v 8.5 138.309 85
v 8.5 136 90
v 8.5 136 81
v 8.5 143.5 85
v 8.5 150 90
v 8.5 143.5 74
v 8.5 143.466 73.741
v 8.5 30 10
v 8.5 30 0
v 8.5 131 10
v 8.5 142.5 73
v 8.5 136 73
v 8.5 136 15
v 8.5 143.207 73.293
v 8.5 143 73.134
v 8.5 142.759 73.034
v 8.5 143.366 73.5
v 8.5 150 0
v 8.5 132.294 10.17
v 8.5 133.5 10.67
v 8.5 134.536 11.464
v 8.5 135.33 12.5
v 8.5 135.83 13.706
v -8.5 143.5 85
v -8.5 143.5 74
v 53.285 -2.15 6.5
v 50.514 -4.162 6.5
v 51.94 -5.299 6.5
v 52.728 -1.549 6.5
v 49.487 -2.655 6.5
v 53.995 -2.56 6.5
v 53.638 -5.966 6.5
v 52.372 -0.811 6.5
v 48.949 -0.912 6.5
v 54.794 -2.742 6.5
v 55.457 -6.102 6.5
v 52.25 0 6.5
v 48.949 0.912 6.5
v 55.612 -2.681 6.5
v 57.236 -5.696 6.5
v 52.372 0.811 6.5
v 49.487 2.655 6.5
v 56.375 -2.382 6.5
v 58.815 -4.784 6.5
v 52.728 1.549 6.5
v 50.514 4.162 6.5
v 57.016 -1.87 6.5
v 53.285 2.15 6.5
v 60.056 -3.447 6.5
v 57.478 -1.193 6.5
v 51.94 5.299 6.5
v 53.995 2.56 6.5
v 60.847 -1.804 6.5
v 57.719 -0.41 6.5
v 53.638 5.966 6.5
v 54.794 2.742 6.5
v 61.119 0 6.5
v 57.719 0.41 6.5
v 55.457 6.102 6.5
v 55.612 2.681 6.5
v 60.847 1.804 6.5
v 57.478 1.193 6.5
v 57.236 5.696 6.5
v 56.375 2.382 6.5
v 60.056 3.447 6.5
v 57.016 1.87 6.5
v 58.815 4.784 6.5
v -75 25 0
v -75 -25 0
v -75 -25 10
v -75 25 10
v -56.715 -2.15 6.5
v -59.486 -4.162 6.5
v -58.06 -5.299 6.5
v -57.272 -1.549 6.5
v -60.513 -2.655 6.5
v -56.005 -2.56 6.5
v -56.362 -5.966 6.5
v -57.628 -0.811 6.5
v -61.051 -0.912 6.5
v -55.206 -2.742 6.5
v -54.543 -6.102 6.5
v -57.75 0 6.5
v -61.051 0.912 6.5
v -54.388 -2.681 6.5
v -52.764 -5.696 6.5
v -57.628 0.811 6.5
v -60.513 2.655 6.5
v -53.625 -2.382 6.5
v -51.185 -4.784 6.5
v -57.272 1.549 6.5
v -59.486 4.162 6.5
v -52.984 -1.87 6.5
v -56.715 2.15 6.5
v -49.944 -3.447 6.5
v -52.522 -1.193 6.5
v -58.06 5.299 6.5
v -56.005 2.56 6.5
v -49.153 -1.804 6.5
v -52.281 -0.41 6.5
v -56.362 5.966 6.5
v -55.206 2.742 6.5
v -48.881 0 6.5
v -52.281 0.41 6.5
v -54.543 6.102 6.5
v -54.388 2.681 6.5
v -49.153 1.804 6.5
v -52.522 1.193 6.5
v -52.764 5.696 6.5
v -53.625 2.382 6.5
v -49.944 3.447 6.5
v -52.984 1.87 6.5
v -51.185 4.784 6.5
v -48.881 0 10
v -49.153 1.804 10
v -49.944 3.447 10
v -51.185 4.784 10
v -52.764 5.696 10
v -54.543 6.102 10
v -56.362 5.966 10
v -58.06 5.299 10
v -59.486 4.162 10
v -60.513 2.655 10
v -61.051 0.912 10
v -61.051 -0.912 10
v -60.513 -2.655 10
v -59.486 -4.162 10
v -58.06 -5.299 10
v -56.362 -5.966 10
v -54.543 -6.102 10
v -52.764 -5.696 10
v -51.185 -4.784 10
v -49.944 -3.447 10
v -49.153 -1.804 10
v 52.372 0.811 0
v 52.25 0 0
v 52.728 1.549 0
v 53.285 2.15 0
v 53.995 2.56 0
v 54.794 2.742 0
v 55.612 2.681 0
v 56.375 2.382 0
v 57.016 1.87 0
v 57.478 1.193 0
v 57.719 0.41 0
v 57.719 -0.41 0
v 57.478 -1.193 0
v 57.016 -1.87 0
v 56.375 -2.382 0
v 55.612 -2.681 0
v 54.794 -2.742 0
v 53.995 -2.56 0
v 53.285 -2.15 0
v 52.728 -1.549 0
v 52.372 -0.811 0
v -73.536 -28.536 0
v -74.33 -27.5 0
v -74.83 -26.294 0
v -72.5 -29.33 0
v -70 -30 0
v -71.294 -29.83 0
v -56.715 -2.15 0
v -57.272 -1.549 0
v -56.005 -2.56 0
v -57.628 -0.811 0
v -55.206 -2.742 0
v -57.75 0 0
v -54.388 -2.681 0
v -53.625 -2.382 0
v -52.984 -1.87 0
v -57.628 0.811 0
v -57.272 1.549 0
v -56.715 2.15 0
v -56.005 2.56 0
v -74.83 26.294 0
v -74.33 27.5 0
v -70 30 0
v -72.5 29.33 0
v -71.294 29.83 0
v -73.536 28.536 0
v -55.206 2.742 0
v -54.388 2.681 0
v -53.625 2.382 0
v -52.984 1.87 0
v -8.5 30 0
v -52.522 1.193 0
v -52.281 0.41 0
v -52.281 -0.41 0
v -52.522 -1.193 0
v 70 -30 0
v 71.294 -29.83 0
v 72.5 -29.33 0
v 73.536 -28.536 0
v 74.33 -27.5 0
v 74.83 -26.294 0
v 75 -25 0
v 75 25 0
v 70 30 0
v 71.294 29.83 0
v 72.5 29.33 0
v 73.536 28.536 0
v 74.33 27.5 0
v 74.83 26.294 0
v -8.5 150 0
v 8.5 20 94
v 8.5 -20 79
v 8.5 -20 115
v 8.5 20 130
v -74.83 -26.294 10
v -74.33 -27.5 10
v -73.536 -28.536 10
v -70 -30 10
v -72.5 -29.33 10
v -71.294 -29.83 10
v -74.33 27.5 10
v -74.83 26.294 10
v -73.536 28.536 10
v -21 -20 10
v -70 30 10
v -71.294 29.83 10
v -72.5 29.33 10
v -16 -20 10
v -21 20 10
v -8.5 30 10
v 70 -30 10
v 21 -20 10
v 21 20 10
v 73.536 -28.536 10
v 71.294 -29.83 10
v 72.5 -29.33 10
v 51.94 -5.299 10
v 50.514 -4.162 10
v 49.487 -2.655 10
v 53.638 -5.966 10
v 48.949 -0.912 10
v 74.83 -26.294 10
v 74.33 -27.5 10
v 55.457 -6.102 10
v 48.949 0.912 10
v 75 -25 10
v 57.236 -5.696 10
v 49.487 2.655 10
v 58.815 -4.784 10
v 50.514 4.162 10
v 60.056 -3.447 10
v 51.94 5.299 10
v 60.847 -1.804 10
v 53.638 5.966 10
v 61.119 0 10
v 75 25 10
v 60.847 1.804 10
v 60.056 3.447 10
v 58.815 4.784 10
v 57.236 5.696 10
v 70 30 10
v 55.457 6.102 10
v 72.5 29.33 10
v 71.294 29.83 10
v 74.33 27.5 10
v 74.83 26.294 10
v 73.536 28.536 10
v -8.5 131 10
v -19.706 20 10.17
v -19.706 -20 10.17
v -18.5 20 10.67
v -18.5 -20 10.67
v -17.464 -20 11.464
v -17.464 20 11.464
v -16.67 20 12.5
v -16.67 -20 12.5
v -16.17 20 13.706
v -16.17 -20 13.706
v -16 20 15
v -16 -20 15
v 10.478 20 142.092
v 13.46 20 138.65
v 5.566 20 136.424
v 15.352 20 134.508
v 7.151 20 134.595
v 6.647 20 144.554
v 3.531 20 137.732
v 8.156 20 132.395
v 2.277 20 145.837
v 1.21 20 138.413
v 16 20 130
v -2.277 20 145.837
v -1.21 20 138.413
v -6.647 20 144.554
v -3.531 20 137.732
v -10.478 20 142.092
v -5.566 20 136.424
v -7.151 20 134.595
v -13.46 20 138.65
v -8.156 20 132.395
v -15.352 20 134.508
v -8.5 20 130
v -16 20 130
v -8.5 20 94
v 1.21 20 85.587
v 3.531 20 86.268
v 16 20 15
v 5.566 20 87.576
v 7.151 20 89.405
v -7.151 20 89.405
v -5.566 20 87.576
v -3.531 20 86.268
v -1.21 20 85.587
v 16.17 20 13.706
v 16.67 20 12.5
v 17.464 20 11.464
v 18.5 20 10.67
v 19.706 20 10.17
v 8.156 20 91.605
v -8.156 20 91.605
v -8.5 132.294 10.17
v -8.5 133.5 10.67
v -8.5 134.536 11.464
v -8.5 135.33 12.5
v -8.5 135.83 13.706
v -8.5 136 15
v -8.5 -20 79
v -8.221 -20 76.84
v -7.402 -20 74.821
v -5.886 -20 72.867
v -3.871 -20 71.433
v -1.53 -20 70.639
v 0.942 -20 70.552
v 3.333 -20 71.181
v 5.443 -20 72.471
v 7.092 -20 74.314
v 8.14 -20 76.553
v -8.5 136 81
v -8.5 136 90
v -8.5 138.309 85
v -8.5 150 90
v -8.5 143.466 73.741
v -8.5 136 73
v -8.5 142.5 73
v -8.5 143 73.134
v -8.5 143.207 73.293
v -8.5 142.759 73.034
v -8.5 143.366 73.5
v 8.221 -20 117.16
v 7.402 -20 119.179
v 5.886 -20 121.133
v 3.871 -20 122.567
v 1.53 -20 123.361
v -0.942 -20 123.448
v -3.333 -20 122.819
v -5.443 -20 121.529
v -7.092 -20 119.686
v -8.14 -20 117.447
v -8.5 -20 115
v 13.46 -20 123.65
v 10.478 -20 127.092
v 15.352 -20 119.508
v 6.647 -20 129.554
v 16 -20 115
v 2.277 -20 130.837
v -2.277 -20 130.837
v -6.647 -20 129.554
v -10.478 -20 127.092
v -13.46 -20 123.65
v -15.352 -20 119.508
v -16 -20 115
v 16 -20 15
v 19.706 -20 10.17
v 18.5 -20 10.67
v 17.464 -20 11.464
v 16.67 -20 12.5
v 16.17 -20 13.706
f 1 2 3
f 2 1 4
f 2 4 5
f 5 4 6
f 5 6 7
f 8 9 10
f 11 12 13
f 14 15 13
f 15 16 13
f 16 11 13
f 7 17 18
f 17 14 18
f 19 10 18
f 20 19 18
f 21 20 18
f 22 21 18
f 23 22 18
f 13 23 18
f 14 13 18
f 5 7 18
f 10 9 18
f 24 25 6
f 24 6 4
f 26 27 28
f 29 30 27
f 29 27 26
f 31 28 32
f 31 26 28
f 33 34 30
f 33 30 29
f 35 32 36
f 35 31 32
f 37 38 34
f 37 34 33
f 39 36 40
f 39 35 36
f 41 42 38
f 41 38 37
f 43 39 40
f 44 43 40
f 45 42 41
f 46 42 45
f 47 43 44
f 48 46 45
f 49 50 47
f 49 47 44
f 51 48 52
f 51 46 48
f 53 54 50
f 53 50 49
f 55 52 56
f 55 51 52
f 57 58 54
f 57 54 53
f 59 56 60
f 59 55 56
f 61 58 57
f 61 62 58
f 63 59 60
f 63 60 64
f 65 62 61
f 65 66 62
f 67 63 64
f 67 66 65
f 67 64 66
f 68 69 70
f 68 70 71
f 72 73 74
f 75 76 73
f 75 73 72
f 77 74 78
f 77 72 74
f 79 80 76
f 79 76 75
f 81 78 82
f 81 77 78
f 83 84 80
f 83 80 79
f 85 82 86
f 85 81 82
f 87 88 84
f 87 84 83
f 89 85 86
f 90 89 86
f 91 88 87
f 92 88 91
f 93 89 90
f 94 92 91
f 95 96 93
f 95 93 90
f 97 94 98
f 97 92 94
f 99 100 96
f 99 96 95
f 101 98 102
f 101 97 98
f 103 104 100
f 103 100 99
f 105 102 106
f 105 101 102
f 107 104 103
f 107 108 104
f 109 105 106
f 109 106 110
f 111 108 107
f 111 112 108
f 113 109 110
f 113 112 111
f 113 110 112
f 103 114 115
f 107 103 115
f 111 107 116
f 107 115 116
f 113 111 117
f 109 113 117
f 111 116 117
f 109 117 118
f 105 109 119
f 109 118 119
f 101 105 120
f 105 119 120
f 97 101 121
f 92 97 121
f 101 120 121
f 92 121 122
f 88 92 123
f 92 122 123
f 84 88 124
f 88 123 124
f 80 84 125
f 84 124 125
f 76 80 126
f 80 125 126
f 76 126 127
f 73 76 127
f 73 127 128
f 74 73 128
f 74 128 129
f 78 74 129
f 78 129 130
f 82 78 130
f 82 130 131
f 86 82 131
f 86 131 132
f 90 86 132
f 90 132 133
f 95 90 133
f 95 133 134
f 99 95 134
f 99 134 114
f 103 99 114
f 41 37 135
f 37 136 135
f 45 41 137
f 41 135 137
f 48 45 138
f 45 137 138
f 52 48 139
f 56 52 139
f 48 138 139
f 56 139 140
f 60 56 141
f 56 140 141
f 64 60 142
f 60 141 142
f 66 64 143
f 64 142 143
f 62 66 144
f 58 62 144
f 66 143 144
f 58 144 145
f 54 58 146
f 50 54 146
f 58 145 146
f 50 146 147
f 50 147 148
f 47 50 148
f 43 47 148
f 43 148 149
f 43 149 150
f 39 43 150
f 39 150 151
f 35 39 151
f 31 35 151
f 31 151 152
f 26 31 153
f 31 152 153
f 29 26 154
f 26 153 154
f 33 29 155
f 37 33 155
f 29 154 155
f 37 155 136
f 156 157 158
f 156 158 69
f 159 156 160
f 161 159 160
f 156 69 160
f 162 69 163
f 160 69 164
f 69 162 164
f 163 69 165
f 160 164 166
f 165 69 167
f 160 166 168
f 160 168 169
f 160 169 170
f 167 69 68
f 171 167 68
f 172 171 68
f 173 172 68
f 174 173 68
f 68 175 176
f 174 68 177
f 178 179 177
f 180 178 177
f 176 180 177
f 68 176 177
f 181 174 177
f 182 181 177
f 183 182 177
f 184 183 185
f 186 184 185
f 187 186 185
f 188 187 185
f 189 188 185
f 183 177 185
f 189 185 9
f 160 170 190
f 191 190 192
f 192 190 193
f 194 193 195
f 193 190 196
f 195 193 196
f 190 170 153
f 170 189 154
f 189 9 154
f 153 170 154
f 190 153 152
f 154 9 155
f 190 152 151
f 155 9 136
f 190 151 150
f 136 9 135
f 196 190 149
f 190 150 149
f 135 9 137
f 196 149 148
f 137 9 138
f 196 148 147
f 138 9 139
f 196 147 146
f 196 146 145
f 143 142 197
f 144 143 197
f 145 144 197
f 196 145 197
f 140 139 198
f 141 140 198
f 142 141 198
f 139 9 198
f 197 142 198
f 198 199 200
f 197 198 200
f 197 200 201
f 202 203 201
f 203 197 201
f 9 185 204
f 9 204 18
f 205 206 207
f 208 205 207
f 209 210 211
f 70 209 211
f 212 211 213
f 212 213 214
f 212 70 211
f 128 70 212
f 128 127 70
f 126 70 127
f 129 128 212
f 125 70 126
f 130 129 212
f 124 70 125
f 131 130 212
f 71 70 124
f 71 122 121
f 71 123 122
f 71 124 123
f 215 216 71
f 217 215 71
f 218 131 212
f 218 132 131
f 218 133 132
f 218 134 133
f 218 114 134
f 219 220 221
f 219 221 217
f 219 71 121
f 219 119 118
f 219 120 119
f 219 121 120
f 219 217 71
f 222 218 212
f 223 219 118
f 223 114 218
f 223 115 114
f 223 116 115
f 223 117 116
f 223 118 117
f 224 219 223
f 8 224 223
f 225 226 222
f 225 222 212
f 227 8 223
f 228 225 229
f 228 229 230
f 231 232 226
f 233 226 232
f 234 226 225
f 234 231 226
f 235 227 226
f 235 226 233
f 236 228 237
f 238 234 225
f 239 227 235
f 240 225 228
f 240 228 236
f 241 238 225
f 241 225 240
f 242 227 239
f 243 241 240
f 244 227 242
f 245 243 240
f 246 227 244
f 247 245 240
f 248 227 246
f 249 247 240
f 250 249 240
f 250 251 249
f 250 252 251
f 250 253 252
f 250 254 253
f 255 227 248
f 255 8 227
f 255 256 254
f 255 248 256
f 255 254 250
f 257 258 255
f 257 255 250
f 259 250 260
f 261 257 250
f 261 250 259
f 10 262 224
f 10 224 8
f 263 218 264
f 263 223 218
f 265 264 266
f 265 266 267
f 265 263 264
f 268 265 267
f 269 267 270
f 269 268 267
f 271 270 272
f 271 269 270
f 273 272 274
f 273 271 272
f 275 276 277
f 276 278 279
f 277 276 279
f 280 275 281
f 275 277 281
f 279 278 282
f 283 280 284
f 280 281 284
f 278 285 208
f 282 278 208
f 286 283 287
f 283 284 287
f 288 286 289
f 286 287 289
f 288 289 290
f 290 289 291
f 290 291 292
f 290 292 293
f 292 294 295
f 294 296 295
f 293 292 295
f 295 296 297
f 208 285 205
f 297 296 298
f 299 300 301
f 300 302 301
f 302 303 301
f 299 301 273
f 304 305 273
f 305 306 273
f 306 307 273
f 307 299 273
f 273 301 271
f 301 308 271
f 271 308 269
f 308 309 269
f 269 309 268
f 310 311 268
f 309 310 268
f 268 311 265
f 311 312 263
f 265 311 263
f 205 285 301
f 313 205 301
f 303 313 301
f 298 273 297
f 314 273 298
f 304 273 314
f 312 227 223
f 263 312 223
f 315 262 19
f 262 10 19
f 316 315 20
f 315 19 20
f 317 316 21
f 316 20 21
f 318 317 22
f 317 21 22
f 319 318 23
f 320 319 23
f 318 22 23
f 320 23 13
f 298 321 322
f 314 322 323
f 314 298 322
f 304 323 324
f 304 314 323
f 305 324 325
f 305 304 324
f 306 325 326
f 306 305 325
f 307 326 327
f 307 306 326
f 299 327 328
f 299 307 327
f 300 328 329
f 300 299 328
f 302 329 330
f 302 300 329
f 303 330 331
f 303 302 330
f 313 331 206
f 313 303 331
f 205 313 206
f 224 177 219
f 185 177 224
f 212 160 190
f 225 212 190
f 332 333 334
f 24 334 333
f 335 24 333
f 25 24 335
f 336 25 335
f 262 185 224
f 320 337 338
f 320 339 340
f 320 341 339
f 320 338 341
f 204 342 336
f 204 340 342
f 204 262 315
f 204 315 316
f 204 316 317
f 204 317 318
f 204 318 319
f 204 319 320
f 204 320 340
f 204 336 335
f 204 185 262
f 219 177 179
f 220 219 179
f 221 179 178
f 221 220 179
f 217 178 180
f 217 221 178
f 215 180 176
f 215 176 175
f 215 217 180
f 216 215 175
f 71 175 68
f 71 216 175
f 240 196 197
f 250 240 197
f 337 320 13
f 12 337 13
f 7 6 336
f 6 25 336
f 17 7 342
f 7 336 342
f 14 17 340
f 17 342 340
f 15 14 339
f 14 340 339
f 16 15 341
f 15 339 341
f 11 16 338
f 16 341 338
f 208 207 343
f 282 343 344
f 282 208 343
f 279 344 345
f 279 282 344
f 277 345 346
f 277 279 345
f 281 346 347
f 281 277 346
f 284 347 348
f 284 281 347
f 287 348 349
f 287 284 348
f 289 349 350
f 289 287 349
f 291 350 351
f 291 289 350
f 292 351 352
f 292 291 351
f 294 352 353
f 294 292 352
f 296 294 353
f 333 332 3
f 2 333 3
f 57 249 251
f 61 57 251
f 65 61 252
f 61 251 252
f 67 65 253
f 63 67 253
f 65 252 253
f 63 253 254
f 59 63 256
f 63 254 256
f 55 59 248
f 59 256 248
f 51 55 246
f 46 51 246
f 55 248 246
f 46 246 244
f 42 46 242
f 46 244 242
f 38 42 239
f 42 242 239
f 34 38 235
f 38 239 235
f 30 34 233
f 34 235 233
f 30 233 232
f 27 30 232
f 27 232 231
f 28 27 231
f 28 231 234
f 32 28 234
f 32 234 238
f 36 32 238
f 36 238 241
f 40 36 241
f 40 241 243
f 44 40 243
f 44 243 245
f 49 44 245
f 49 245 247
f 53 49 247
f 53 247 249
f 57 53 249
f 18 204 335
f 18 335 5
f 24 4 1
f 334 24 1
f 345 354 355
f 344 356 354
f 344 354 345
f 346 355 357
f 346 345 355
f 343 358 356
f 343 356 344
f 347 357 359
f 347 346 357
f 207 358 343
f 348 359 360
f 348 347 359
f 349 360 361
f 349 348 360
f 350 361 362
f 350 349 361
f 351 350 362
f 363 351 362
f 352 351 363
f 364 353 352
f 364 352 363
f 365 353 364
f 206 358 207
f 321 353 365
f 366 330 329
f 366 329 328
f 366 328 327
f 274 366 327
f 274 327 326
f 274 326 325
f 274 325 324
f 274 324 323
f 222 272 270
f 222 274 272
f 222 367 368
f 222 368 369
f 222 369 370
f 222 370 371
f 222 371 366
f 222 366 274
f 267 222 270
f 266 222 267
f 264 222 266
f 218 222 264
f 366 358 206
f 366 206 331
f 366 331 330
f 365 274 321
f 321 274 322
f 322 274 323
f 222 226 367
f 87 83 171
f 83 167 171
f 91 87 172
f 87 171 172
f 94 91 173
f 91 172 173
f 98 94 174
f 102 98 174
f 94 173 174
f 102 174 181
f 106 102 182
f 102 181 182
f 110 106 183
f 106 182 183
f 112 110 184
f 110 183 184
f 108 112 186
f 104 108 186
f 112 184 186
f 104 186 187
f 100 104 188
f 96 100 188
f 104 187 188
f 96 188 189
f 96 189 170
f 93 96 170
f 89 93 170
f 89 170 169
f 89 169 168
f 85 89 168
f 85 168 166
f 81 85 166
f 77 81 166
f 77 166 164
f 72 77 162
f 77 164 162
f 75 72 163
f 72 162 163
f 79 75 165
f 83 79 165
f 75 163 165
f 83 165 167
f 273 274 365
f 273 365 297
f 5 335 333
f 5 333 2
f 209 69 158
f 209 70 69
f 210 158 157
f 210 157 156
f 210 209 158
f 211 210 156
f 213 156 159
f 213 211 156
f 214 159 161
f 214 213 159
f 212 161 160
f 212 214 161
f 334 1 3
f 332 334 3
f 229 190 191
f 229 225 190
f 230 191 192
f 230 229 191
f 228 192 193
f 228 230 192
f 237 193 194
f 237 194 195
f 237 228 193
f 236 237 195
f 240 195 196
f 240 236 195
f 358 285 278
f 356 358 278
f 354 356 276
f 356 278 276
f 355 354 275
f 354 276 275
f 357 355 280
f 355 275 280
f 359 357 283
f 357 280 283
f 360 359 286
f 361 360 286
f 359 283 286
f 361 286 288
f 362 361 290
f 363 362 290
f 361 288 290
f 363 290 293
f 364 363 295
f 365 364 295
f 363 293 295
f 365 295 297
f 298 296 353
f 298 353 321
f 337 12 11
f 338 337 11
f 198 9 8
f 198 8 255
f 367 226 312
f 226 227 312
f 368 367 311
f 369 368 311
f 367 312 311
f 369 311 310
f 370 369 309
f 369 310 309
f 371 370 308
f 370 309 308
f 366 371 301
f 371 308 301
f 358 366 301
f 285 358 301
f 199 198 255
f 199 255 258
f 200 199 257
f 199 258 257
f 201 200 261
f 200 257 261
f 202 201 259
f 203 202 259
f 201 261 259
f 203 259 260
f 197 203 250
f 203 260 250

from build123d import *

# Parameters (mm, degrees)
SKETCH1_W                               = 150
SKETCH1_H                               = 60
BOSS_EXTRUDE1_DEPTH                     = 10
CBORE_FOR_M5_HEX_HEAD_BOLT1_D           = 5.5
CBORE_FOR_M5_HEX_HEAD_BOLT1_CBORE_D     = 12.238
CBORE_FOR_M5_HEX_HEAD_BOLT1_CBORE_DEPTH = 3.5
SKETCH4_W                               = 32
SKETCH4_H                               = 40
BOSS_EXTRUDE2_DEPTH                     = 120
CUT_EXTRUDE1_DEPTH                      = 120
BOSS_EXTRUDE3_DEPTH                     = 42.720018727
CUT_EXTRUDE2_DEPTH                      = 45.625
SKETCH10_W                              = 17
SKETCH10_H                              = 10
BOSS_EXTRUDE4_DEPTH                     = 120
SKETCH11_W                              = 17
SKETCH11_H                              = 14
BOSS_EXTRUDE5_DEPTH                     = 80
CUT_EXTRUDE3_DEPTH                      = 95
FILLET1_R                               = 5
FILLET2_R                               = 5
FILLET3_R                               = 5
FILLET4_R                               = 1


with BuildPart() as part:
    # Sketch1 → Boss-Extrude1 (new body)
    with BuildSketch(Plane.XY):
        Rectangle(SKETCH1_W, SKETCH1_H)
    extrude(amount=BOSS_EXTRUDE1_DEPTH)

    # CBORE for M5 Hex Head Bolt1 (through all)
    with Locations(Plane(origin=(-55, 0, 10), x_dir=(1, 0, 0), z_dir=(0, 0, 1))):
        with Locations((0, 0), (110, 0)):
            CounterBoreHole(CBORE_FOR_M5_HEX_HEAD_BOLT1_D / 2, CBORE_FOR_M5_HEX_HEAD_BOLT1_CBORE_D / 2, CBORE_FOR_M5_HEX_HEAD_BOLT1_CBORE_DEPTH)

    # Sketch4 → Boss-Extrude2 (add)
    with BuildSketch(Plane.XY.offset(10)):
        Rectangle(SKETCH4_W, SKETCH4_H)
    extrude(amount=BOSS_EXTRUDE2_DEPTH)

    # Sketch7 → Cut-Extrude1 (cut)
    with BuildSketch(Plane(origin=(16, 0, 0), x_dir=(0, 0, -1), z_dir=(1, 0, 0))):
        Polygon((-130, 20), (-115, -20), (-130, -20), align=None)
    extrude(amount=-CUT_EXTRUDE1_DEPTH, mode=Mode.SUBTRACT)

    # Sketch8 → Boss-Extrude3 (add, along a direction that is not the sketch's normal)
    with BuildSketch(Plane(origin=(0, 20, 0), x_dir=(1, 0, 0), z_dir=(0, 1, 0))):
        with BuildLine():
            Line((-16, -130), (16, -130))
            ThreePointArc((16, -130), (0, -146), (-16, -130))
        make_face()
    extrude(amount=-BOSS_EXTRUDE3_DEPTH, dir=(0, 0.9363291775690444, 0.351123441588392))

    # Sketch9 → Cut-Extrude2 (cut, along a direction that is not the sketch's normal)
    with BuildSketch(Plane(origin=(0, 20, 0), x_dir=(1, 0, 0), z_dir=(0, 1, 0))):
        with BuildLine():
            Line((8.5, -94), (8.5, -130))
            ThreePointArc((8.5, -130), (0, -138.5), (-8.5, -130))
            Line((-8.5, -130), (-8.5, -94))
            ThreePointArc((-8.5, -94), (0, -85.5), (8.5, -94))
        make_face()
    extrude(amount=-CUT_EXTRUDE2_DEPTH, dir=(0, 0.9363291775690444, 0.351123441588392), mode=Mode.SUBTRACT)

    # Sketch10 → Boss-Extrude4 (add)
    with BuildSketch(Plane(origin=(0, 30, 0), x_dir=(1, 0, 0), z_dir=(0, 1, 0))):
        with Locations((0, -5)):
            Rectangle(SKETCH10_W, SKETCH10_H)
    extrude(amount=BOSS_EXTRUDE4_DEPTH)

    # Sketch11 → Boss-Extrude5 (add)
    with BuildSketch(Plane.XY.offset(10)):
        with Locations((0, 143)):
            Rectangle(SKETCH11_W, SKETCH11_H)
    extrude(amount=BOSS_EXTRUDE5_DEPTH)

    # Sketch13 → Cut-Extrude3 (cut)
    with BuildSketch(Plane(origin=(8.5, 0, 0), x_dir=(0, 0, -1), z_dir=(1, 0, 0))):
        Polygon((-85, 143.5), (-85, 138.309401077), (-81, 136), (-73, 136), (-73, 143.5), align=None)
    extrude(amount=-CUT_EXTRUDE3_DEPTH, mode=Mode.SUBTRACT)

    # Fillet1
    fillet1_edges = [part.edges().sort_by_distance(p)[0] for p in [
        (0, 136, 10),
    ]]
    fillet(fillet1_edges, radius=FILLET1_R)

    # Fillet2
    fillet2_edges = [part.edges().sort_by_distance(p)[0] for p in [
        (75, -30, 5),
        (-75, -30, 5),
        (-75, 30, 5),
        (75, 30, 5),
    ]]
    fillet(fillet2_edges, radius=FILLET2_R)

    # Fillet3
    fillet3_edges = [part.edges().sort_by_distance(p)[0] for p in [
        (16, 0, 10),
        (-16, 0, 10),
    ]]
    fillet(fillet3_edges, radius=FILLET3_R)

    # Fillet4
    fillet4_edges = [part.edges().sort_by_distance(p)[0] for p in [
        (0, 143.5, 73),
    ]]
    fillet(fillet4_edges, radius=FILLET4_R)


solid = part.part
